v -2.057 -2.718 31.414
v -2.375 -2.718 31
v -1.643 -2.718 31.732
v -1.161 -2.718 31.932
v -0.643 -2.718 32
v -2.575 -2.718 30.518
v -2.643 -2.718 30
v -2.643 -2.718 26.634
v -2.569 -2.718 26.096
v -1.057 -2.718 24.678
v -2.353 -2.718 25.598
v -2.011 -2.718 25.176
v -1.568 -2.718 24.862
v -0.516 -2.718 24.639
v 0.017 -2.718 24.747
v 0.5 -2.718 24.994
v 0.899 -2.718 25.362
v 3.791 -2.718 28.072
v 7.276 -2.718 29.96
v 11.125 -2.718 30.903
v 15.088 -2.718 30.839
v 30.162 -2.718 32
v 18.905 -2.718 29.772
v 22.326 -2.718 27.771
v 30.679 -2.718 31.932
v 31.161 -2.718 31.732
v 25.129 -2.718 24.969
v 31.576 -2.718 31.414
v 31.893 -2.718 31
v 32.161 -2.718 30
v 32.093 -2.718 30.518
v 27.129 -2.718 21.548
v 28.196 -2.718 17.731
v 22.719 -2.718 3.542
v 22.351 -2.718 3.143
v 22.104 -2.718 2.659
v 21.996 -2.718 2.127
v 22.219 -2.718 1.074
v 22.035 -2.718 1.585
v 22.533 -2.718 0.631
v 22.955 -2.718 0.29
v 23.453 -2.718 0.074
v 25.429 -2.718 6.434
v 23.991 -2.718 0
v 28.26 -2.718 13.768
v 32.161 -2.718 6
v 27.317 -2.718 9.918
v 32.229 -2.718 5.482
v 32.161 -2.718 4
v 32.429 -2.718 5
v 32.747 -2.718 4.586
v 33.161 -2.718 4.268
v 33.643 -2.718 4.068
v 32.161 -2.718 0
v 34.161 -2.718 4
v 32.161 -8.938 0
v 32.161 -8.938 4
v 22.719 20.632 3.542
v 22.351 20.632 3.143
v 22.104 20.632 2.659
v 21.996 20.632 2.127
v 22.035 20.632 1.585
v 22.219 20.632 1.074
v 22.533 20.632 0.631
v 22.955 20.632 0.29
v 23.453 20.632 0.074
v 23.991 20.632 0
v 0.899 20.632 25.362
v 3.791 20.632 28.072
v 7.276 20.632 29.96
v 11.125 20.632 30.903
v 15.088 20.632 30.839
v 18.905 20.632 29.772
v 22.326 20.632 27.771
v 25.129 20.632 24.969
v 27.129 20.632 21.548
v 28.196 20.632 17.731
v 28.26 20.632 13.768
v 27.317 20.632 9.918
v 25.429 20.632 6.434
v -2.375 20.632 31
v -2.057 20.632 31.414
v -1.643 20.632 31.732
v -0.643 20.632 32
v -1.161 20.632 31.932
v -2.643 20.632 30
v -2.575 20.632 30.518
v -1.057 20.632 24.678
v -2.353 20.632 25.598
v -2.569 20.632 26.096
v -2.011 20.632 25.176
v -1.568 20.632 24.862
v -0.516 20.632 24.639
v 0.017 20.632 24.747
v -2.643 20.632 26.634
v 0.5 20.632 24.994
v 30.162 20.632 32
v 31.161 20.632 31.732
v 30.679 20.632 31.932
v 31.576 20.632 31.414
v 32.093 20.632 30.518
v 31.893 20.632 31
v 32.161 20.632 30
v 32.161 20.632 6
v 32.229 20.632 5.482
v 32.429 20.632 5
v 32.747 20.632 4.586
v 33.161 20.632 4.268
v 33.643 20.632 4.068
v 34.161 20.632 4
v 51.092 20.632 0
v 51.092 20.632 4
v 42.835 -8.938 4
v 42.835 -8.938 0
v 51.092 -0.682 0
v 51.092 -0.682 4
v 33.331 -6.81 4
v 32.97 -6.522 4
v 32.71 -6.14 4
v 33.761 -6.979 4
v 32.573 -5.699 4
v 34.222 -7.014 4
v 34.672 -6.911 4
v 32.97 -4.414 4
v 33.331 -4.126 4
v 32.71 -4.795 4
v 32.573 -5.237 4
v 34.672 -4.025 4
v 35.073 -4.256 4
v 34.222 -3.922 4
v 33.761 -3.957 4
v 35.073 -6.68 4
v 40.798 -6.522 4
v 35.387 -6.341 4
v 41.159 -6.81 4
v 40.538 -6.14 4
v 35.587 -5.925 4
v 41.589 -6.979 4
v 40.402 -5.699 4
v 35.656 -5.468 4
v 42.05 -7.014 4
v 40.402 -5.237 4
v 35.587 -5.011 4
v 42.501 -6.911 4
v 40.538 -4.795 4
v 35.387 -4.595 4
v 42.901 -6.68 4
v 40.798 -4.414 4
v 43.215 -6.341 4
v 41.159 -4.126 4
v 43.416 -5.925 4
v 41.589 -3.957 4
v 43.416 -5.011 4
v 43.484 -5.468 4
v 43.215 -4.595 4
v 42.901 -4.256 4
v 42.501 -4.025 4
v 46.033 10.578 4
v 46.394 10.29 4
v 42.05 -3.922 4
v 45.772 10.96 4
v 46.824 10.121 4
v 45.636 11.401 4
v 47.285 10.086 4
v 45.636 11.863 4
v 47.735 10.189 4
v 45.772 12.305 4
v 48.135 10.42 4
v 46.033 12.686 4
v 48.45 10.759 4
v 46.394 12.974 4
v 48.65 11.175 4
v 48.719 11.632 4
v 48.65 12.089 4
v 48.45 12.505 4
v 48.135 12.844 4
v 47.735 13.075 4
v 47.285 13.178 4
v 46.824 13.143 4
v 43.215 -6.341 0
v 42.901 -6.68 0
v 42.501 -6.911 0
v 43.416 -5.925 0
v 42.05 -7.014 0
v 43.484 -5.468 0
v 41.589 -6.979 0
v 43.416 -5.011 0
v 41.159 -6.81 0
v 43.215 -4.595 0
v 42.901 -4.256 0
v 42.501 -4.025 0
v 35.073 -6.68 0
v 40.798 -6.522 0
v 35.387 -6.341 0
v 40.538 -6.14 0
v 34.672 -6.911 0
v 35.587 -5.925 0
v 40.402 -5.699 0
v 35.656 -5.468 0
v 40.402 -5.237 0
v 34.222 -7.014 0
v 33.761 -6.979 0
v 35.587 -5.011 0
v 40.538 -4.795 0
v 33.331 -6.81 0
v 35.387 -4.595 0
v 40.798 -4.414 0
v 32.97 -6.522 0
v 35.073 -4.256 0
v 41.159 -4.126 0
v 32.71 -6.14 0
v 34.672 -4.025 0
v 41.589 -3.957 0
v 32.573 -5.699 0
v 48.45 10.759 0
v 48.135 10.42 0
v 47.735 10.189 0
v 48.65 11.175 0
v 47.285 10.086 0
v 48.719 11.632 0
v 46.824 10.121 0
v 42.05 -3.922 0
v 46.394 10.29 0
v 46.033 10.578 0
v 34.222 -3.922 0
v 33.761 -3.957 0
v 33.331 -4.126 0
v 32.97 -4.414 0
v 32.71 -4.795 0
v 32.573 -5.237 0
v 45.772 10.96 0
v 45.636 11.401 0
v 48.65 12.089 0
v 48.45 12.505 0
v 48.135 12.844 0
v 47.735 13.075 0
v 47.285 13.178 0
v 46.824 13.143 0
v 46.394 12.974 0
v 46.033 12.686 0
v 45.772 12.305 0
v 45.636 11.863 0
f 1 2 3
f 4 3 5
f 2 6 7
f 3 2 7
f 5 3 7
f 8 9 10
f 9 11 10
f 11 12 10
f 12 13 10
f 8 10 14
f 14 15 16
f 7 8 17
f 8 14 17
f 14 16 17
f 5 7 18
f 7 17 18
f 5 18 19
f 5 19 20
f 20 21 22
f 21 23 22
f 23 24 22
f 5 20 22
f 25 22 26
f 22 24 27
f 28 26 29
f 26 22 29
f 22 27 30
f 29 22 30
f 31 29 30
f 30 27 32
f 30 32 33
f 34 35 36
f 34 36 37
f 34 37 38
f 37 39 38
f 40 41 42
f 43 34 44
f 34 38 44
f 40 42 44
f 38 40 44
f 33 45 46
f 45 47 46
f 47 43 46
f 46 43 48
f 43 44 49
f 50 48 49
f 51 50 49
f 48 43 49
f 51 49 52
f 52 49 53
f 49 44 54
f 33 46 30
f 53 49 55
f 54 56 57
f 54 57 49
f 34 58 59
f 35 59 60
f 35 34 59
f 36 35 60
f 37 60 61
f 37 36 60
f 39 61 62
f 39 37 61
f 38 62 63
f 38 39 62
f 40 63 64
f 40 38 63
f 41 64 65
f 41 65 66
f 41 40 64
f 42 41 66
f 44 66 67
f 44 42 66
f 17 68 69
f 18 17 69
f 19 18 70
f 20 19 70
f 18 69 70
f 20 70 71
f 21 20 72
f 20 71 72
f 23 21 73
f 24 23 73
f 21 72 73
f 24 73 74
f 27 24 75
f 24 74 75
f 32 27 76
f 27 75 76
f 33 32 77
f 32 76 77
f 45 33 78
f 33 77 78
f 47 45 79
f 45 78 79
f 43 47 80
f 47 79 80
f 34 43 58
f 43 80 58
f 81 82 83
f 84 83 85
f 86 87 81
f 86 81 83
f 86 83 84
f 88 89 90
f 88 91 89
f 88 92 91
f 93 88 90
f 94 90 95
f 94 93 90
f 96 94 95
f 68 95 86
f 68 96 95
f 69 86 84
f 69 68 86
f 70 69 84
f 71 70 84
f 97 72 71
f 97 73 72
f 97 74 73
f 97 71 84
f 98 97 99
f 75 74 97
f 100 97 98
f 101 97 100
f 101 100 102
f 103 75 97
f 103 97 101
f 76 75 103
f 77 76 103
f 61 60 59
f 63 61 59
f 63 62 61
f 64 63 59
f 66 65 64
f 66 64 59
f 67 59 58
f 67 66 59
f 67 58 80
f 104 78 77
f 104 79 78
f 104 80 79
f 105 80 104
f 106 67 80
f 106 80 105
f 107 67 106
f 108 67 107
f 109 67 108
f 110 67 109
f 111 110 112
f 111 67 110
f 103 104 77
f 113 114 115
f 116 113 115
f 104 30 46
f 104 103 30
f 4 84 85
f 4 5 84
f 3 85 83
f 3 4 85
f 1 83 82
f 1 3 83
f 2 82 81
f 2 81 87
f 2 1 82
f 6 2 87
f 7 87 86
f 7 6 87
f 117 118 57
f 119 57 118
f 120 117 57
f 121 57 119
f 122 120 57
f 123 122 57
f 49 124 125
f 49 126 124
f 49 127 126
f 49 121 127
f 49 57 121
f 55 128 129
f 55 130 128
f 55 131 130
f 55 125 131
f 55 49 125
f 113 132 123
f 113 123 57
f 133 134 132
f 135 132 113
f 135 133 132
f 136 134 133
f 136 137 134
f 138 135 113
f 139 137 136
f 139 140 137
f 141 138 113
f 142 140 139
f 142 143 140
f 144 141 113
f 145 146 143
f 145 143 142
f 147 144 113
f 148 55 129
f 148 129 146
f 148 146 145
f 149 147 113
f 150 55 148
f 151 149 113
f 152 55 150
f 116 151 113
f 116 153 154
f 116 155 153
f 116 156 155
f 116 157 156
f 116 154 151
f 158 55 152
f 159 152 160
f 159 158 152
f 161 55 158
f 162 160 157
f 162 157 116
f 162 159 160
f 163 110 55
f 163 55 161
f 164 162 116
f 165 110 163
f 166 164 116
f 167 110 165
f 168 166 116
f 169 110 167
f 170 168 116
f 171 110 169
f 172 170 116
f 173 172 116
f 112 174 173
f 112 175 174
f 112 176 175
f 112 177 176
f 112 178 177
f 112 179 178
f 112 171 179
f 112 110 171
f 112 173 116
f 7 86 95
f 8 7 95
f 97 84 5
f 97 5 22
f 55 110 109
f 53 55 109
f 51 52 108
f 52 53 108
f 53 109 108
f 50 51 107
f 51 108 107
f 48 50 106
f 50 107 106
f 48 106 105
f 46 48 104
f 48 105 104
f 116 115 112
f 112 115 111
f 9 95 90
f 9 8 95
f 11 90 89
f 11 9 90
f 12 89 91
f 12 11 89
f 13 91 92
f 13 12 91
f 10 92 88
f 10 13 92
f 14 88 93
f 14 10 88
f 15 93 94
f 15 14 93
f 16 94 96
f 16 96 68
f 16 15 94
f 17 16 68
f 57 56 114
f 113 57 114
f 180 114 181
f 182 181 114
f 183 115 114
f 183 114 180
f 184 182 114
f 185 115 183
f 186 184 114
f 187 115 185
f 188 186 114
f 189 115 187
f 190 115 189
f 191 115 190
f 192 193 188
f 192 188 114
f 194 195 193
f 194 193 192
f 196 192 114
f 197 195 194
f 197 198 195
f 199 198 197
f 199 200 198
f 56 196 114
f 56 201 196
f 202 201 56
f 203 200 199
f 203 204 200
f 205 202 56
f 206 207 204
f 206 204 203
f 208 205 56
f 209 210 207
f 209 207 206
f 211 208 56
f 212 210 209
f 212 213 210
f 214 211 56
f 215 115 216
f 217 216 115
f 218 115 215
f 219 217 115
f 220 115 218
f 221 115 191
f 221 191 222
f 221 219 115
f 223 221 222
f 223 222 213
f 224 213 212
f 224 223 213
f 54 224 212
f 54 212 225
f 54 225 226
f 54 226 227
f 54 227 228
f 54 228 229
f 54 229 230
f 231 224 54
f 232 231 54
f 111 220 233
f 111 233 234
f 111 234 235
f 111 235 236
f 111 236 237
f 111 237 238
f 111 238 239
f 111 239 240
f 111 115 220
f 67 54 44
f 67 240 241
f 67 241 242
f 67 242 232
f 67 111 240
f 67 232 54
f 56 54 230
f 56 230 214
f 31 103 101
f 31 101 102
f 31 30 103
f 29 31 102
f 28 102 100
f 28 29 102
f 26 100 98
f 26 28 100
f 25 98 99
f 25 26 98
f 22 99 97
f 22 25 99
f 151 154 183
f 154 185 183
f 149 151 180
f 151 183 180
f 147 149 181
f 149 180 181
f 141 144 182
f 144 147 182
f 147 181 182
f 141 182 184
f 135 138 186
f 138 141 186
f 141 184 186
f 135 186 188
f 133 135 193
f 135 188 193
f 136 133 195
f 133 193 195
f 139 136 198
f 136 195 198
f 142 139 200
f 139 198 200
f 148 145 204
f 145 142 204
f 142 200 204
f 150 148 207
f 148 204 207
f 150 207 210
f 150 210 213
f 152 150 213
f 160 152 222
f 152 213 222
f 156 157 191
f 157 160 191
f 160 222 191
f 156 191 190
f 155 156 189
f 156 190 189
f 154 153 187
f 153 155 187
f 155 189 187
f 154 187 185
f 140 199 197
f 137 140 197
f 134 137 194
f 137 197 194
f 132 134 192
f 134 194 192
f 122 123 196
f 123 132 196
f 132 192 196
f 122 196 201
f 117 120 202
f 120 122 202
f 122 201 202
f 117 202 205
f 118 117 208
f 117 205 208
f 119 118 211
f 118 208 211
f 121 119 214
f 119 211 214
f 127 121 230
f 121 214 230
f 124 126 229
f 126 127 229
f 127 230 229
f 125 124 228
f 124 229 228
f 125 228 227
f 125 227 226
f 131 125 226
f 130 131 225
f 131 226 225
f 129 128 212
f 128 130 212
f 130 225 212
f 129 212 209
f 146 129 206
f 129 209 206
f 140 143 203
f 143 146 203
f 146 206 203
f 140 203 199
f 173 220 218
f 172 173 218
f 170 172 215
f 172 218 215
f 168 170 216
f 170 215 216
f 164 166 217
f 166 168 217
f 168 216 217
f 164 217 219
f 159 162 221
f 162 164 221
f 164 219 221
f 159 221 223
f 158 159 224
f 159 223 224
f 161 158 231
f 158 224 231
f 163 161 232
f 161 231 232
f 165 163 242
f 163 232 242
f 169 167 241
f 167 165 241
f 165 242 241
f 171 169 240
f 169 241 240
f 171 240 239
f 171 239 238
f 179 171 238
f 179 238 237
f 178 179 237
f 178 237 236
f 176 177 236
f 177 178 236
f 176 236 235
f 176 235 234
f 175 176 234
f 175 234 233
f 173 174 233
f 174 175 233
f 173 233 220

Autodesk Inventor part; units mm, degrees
ref_plane "YZ Plane" through (0, 0, 0) normal (1, 0, 0) x (0, 1, 0)
ref_plane "XZ Plane" through (0, 0, 0) normal (0, 1, 0) x (-1, 0, 0)
ref_plane "Work Plane1" through (0, 0, 0) normal (0, 0, 1) x (1, 0, 0)
sketch "Sketch1" plane through (0, 0, 0) normal (0, 0, 1) x (1, 0, 0)
  circle A0 centre (2.6061, 6.2821) radius 1.5 construction
  circle A1 centre (22.6061, 6.2821) radius 1.5 construction
  line L0 (-2.6427, 15.6321) -> (-2.6427, -2.7179) construction
  line L1 (-2.6427, -2.7179) -> (30.1061, -2.7179) construction
  line L2 (30.1061, -2.7179) -> (30.1061, -39.6443) construction
  line L3 (30.1061, -39.6443) -> (66.9651, 7.5331) construction
  line L4 (66.9651, 7.5331) -> (66.9651, 15.6321) construction
  line L5 (66.9651, 15.6321) -> (-2.6427, 15.6321) construction
  circle A2 centre (12.3511, 11.6321) radius 1.45 construction
  circle A3 centre (41.9344, -5.4679) radius 1.45 construction
  circle A4 centre (34.1061, -5.4679) radius 1.45 construction
  circle A5 centre (54.6178, 11.6321) radius 1.45 construction
  circle A6 centre (-0.6427, 11.6823) radius 1.45 construction
  circle A7 centre (29.5857, 11.6321) radius 1.45 construction
  circle A8 centre (51.7579, -5.4342) radius 1.45 construction
  circle A9 centre (34.1061, -24.4536) radius 1.45 construction
  circle A10 centre (47.169, 11.6321) radius 1.45 construction
  line L6 (-2.0689, 15.0821) -> (-2.0689, 2.6821) construction
  line L7 (27.2811, 15.0821) -> (27.2811, 2.6821) construction
  line L8 (32.1612, -8.9378) -> (42.8353, -8.9378)
  line L9 (42.8353, -8.9378) -> (51.0915, -0.6816)
  line L10 (51.0915, -0.6816) -> (51.0915, 15.6321)
  line L11 (32.1612, -8.9378) -> (32.1612, 15.6321)
  line L12 (32.1612, 15.6321) -> (51.0915, 15.6321)
  circle A11 centre (34.1061, -5.4679) radius 1.55
  circle A12 centre (41.9344, -5.4679) radius 1.55
  circle A13 centre (47.169, 11.6321) radius 1.55
  line L13 (32.1612, 15.6321) -> (51.0915, 15.6321)
  line L14 (51.0915, 15.6321) -> (51.0915, 20.6321)
  line L15 (51.0915, 20.6321) -> (32.1612, 20.6321)
  line L16 (32.1612, 20.6321) -> (32.1612, 15.6321)
  point P0 (0, 0)
  dimension "d0" = 135
  dimension "d1" = 3.1
  dimension "d2" = 3.1
  dimension "d3" = 3.1
  dimension "d16" = 5
extrude "Extrusion1" add sketch "Sketch1" along normal blind 4
sketch "Sketch5" plane through (32.1612, 20.6321, 0) normal (0, 1, 0) x (1, 0, 0)
  circle A0 centre (-19.5551, -14.65) radius 15.24 construction
  circle A1 centre (-19.3039, -15.5) radius 15.5 construction
  line L0 (-34.8039, 0) -> (-34.8039, -32) construction
  line L1 (34.8039, 0) -> (-34.8039, 0) construction
  line L2 (0, 0) -> (18.9303, 0) construction
  line L3 (0, 0) -> (0, -4) construction
  line L4 (18.9303, -4) -> (0, -4) construction
  line L5 (18.9303, 0) -> (18.9303, -4) construction
  line L6 (0, 0) -> (18.9303, 0) construction
  line L7 (0, 0) -> (-19.3058, 0) construction
  line L8 (0, 0) -> (-19.3039, 0)
  line L9 (-34.8039, -32) -> (0, -32)
  line L10 (0, -32) -> (0, 0)
  arc A2 (-34.8039, -15.5) -> (-19.3039, 0) centre (-19.3039, -15.5) ccw
  line L11 (-34.8039, -32) -> (-34.8039, -15.5)
  point P0 (-32.1612, 0)
  dimension "d21" = 31
ref_plane "Work Plane3" through (-2.6427, -2.7179, 0) normal (0, 1, 0) x (0, 0, 1)
extrude "Extrusion5" add sketch "Sketch5" against normal up to surface (23.35 mm away)
fillet "Fillet1" radius 2 5 edges at (-2.6427, 8.9571, 15.5) (12.8573, 8.9571, 0) (32.1612, 8.9571, 32) (-2.6427, 8.9571, 32) (32.1612, 8.9571, 4)
properties part number "cellSTORM_alviumadapter"
